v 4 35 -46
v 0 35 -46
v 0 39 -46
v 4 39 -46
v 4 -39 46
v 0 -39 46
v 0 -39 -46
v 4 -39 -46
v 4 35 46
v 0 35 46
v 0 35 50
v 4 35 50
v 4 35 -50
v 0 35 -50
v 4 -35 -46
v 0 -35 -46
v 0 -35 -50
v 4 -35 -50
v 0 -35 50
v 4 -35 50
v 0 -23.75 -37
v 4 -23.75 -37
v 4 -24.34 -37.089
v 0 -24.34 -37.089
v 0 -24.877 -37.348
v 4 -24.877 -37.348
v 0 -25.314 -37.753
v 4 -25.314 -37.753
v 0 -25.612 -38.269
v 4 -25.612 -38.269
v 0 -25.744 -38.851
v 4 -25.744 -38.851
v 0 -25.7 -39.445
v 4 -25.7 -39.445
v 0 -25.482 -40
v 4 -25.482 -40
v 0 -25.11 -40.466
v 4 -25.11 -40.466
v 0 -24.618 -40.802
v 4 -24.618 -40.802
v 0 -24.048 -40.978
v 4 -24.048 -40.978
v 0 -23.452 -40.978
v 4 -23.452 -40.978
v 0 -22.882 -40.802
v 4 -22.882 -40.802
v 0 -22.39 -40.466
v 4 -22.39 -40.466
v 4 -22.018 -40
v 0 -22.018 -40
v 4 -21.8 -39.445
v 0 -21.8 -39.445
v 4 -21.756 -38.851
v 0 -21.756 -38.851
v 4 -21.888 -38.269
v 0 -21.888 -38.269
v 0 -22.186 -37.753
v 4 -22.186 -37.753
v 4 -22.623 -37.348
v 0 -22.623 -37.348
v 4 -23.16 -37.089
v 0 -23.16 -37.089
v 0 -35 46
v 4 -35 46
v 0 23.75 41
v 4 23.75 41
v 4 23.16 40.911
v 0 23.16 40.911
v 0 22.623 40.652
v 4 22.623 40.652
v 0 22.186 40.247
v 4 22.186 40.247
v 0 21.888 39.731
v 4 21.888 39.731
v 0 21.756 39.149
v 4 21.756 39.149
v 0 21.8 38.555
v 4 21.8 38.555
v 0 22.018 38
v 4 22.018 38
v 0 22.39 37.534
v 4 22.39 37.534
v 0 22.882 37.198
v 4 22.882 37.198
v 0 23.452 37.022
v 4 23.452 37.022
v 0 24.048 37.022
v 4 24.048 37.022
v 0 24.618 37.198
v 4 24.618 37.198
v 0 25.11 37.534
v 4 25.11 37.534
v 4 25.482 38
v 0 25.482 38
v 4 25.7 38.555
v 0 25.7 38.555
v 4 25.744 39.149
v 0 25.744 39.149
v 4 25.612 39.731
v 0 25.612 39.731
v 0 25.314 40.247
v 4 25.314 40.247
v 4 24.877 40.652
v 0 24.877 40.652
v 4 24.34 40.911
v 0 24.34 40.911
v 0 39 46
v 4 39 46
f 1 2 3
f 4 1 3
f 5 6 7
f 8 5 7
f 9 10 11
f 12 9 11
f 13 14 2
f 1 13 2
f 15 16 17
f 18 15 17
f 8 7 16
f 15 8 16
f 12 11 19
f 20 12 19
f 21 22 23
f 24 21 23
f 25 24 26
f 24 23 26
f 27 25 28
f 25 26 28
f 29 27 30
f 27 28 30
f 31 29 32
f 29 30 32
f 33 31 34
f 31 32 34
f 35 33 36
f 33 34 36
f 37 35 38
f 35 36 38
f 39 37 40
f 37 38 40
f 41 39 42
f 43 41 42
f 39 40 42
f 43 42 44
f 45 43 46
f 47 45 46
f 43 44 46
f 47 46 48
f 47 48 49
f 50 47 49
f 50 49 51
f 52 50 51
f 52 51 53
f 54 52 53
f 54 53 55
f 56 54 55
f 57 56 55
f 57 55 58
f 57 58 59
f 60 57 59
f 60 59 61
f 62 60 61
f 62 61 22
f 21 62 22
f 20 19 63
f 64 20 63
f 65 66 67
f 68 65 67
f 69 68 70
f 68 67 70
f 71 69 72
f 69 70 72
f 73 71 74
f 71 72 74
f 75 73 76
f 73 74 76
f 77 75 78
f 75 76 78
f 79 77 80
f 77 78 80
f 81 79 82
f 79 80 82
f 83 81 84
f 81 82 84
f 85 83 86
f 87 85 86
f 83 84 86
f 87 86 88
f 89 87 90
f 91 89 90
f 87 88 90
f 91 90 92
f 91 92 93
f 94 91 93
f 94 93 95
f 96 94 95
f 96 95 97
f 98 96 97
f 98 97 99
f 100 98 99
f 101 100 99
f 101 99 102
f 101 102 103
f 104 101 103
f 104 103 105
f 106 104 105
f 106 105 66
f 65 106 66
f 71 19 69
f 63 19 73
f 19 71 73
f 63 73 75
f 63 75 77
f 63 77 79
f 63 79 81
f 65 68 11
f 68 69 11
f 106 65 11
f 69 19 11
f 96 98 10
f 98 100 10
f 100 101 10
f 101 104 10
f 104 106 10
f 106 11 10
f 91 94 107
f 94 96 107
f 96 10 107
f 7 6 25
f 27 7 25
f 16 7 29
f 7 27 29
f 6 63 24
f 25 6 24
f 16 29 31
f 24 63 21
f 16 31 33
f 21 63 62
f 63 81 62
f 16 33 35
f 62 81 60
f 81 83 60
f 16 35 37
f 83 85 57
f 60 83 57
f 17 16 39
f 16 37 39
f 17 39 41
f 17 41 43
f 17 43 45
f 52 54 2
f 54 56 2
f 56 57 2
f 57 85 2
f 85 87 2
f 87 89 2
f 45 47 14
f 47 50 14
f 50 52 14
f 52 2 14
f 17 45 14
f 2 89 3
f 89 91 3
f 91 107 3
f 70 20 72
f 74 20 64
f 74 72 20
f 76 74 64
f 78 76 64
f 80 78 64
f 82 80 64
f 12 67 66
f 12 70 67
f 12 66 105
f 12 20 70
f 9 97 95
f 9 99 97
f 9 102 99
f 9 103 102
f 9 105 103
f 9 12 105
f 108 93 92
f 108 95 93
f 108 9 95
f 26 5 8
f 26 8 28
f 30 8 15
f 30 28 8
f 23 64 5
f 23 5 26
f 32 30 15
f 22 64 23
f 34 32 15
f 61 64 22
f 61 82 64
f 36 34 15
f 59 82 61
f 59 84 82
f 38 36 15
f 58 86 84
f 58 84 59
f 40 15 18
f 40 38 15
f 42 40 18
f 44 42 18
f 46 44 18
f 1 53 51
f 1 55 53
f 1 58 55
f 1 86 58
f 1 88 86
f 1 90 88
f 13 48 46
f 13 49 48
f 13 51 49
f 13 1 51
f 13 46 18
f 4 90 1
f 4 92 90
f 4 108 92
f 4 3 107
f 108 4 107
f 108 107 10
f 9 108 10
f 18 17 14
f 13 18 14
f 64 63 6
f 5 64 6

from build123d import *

# Parameters (mm, degrees)
BOSS_EXTRUDE1_DEPTH   = 4
F_4_0MM_DOWEL_HOLE1_D = 4


with BuildPart() as part:
    # Sketch1 → Boss-Extrude1 (new body)
    with BuildSketch(Plane(origin=(0, 0, 0), x_dir=(0, 0, -1), z_dir=(1, 0, 0))):
        Polygon((-46, 35), (-50, 35), (-50, 0), (0, 0), (0, 39), (-46, 39), align=None)
        Polygon((0, 39), (0, 0), (50, 0), (50, 35), (46, 35), (46, 39), align=None)
        Polygon((50, 0), (0, 0), (0, -39), (46, -39), (46, -35), (50, -35), align=None)
        Polygon((0, 0), (-50, 0), (-50, -35), (-46, -35), (-46, -39), (0, -39), align=None)
    extrude(amount=BOSS_EXTRUDE1_DEPTH)

    # Ø4.0mm Dowel Hole1 (through all)
    with Locations(Plane(origin=(0, -23.75, -39), x_dir=(0, 0, -1), z_dir=(-1, 0, 0))):
        with Locations((0, 0), (-78, -47.5)):
            Hole(F_4_0MM_DOWEL_HOLE1_D / 2)


solid = part.part
